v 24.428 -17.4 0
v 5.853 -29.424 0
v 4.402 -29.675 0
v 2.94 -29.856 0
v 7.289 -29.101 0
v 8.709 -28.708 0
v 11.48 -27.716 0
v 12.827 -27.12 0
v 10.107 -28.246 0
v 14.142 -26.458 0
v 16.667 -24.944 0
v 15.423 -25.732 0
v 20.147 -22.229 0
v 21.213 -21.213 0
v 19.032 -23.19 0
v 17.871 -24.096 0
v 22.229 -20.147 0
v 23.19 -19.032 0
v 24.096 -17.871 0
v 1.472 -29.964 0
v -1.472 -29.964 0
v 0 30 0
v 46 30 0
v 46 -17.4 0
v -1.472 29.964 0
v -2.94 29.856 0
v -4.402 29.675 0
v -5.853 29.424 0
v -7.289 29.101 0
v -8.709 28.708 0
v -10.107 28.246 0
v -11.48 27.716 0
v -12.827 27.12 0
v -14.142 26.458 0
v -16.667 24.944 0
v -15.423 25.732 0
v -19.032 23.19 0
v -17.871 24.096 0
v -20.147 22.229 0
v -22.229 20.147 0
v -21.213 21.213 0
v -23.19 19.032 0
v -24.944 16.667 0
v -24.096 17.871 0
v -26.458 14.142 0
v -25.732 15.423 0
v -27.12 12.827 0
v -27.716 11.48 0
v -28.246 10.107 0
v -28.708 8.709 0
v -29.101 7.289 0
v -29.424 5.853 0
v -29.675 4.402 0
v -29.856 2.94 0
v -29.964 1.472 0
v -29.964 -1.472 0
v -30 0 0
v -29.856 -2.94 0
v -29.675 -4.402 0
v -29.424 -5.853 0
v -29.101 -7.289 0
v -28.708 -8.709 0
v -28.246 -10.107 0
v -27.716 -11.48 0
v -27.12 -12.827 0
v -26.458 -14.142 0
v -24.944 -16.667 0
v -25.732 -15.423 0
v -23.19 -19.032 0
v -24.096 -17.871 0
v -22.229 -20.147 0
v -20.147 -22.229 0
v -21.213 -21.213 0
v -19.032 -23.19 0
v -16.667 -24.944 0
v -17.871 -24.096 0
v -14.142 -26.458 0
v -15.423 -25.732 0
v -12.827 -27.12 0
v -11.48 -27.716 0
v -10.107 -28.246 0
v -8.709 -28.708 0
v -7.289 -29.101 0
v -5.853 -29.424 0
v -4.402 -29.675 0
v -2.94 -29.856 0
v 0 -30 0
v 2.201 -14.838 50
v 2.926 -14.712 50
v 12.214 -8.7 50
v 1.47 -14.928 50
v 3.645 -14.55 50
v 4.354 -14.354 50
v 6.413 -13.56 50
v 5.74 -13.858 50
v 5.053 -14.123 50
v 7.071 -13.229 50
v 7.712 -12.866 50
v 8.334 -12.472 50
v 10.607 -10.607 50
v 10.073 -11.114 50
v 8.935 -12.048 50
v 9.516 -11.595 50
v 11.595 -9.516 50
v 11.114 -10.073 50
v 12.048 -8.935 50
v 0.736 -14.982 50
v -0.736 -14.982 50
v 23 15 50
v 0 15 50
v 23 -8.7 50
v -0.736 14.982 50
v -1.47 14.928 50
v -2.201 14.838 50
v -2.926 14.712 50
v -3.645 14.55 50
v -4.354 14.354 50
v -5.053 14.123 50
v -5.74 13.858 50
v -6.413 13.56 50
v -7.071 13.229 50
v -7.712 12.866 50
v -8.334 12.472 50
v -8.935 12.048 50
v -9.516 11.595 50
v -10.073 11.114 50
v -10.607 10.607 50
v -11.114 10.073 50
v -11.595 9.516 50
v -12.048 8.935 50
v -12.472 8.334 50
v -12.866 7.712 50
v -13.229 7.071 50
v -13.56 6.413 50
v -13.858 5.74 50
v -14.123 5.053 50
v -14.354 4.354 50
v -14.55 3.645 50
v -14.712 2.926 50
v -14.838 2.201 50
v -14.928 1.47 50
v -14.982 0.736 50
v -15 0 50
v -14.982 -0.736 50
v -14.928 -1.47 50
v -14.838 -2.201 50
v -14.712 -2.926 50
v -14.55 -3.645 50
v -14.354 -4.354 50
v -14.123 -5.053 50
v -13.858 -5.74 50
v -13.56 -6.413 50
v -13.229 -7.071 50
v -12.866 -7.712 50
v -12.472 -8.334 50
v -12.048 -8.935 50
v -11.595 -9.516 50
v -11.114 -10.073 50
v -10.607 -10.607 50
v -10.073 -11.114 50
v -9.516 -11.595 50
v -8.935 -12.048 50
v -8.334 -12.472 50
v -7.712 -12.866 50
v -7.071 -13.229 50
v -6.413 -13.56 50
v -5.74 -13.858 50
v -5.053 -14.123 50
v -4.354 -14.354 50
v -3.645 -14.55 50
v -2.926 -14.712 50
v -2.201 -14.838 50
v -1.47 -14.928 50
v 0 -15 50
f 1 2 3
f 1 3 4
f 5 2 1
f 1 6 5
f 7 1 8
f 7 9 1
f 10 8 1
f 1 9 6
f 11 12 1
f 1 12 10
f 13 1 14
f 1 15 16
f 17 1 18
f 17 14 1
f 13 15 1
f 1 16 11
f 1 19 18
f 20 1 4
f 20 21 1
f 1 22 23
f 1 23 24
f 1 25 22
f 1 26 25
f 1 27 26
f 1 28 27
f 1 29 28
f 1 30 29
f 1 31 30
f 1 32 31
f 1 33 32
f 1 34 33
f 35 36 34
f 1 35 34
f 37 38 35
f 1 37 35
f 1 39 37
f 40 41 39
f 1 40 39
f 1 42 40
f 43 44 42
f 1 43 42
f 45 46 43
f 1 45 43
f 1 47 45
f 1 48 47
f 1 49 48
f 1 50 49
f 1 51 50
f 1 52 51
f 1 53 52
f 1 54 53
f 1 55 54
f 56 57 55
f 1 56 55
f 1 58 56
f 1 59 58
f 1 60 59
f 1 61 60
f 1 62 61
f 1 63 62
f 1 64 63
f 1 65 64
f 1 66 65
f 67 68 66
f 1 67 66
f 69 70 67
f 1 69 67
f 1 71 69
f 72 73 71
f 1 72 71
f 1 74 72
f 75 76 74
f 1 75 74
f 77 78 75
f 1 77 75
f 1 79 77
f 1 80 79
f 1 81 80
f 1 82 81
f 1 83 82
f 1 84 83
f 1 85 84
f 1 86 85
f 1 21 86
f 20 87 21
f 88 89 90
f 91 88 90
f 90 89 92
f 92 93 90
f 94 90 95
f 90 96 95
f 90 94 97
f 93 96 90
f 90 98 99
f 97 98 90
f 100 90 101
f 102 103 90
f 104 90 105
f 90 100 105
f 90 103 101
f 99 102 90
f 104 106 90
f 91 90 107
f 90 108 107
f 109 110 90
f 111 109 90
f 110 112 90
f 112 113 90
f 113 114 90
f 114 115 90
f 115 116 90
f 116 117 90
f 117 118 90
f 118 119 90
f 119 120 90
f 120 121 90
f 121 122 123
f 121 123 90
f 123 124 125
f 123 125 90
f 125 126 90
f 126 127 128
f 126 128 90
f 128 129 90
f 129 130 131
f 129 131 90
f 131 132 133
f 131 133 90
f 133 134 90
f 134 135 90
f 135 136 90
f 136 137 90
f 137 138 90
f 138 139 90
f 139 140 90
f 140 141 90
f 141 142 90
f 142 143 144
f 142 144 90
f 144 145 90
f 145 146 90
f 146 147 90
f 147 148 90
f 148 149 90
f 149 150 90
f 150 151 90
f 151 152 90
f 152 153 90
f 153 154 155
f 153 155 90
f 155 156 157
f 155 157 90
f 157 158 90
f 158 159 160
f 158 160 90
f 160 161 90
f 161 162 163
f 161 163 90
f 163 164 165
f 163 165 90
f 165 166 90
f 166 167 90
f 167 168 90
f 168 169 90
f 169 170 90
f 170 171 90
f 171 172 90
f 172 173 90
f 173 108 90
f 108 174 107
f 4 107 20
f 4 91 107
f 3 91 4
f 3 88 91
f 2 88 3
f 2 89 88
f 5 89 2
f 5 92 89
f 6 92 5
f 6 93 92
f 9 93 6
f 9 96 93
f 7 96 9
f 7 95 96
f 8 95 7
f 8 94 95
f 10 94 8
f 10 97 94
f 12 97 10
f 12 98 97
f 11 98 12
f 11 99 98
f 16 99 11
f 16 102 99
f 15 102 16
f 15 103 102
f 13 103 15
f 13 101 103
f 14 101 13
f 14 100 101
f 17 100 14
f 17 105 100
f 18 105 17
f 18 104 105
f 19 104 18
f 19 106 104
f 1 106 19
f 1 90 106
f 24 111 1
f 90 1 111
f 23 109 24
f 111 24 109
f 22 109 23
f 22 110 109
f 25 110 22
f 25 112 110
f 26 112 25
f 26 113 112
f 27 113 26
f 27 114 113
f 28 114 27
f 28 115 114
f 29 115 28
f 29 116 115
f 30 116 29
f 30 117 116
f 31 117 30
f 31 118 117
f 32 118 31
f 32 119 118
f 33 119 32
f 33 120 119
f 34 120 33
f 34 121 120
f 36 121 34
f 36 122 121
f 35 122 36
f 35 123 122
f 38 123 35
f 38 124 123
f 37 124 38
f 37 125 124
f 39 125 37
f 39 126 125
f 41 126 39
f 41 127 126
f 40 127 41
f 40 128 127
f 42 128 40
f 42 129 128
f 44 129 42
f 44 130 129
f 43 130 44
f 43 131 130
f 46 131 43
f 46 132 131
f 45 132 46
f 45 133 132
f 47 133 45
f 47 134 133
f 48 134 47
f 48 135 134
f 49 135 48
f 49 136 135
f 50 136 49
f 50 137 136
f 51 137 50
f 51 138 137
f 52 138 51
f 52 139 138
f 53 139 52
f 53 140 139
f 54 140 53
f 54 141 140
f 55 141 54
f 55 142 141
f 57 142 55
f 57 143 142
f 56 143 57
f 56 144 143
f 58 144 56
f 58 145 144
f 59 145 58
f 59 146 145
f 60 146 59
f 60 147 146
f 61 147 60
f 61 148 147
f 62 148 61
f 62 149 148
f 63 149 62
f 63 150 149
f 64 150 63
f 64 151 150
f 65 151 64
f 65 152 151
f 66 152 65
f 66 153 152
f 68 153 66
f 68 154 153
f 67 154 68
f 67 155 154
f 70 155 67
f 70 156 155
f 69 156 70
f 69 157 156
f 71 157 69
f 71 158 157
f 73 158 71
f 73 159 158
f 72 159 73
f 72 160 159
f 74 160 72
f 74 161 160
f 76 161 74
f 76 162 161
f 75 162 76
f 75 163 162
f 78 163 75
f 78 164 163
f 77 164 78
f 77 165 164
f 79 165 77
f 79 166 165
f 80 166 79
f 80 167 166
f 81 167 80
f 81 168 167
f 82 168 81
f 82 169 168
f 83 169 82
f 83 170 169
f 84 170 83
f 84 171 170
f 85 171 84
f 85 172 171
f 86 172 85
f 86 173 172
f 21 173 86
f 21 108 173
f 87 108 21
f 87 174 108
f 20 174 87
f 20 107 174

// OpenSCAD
vessel_width = 83;
vessel_length = 122;
t_radius = 30.0 / 2.0;
t_length = 38.0 - t_radius;
t_width = 23.7;
stand_height = 50;
thickness = 1.0;
fn = 128;

module t_shape(scaler) {
  scale([scaler, scaler, 1.0])
  union() {
    circle(t_radius);
    translate([0, -(t_width-t_radius), 0])
    square([t_length,t_width]);
  }  
}

module render()
{
  base_scale = 2.0;
  linear_extrude(height=stand_height, scale=0.5, $fn=fn)
  t_shape(base_scale);
}

echo(version=version());

render();
